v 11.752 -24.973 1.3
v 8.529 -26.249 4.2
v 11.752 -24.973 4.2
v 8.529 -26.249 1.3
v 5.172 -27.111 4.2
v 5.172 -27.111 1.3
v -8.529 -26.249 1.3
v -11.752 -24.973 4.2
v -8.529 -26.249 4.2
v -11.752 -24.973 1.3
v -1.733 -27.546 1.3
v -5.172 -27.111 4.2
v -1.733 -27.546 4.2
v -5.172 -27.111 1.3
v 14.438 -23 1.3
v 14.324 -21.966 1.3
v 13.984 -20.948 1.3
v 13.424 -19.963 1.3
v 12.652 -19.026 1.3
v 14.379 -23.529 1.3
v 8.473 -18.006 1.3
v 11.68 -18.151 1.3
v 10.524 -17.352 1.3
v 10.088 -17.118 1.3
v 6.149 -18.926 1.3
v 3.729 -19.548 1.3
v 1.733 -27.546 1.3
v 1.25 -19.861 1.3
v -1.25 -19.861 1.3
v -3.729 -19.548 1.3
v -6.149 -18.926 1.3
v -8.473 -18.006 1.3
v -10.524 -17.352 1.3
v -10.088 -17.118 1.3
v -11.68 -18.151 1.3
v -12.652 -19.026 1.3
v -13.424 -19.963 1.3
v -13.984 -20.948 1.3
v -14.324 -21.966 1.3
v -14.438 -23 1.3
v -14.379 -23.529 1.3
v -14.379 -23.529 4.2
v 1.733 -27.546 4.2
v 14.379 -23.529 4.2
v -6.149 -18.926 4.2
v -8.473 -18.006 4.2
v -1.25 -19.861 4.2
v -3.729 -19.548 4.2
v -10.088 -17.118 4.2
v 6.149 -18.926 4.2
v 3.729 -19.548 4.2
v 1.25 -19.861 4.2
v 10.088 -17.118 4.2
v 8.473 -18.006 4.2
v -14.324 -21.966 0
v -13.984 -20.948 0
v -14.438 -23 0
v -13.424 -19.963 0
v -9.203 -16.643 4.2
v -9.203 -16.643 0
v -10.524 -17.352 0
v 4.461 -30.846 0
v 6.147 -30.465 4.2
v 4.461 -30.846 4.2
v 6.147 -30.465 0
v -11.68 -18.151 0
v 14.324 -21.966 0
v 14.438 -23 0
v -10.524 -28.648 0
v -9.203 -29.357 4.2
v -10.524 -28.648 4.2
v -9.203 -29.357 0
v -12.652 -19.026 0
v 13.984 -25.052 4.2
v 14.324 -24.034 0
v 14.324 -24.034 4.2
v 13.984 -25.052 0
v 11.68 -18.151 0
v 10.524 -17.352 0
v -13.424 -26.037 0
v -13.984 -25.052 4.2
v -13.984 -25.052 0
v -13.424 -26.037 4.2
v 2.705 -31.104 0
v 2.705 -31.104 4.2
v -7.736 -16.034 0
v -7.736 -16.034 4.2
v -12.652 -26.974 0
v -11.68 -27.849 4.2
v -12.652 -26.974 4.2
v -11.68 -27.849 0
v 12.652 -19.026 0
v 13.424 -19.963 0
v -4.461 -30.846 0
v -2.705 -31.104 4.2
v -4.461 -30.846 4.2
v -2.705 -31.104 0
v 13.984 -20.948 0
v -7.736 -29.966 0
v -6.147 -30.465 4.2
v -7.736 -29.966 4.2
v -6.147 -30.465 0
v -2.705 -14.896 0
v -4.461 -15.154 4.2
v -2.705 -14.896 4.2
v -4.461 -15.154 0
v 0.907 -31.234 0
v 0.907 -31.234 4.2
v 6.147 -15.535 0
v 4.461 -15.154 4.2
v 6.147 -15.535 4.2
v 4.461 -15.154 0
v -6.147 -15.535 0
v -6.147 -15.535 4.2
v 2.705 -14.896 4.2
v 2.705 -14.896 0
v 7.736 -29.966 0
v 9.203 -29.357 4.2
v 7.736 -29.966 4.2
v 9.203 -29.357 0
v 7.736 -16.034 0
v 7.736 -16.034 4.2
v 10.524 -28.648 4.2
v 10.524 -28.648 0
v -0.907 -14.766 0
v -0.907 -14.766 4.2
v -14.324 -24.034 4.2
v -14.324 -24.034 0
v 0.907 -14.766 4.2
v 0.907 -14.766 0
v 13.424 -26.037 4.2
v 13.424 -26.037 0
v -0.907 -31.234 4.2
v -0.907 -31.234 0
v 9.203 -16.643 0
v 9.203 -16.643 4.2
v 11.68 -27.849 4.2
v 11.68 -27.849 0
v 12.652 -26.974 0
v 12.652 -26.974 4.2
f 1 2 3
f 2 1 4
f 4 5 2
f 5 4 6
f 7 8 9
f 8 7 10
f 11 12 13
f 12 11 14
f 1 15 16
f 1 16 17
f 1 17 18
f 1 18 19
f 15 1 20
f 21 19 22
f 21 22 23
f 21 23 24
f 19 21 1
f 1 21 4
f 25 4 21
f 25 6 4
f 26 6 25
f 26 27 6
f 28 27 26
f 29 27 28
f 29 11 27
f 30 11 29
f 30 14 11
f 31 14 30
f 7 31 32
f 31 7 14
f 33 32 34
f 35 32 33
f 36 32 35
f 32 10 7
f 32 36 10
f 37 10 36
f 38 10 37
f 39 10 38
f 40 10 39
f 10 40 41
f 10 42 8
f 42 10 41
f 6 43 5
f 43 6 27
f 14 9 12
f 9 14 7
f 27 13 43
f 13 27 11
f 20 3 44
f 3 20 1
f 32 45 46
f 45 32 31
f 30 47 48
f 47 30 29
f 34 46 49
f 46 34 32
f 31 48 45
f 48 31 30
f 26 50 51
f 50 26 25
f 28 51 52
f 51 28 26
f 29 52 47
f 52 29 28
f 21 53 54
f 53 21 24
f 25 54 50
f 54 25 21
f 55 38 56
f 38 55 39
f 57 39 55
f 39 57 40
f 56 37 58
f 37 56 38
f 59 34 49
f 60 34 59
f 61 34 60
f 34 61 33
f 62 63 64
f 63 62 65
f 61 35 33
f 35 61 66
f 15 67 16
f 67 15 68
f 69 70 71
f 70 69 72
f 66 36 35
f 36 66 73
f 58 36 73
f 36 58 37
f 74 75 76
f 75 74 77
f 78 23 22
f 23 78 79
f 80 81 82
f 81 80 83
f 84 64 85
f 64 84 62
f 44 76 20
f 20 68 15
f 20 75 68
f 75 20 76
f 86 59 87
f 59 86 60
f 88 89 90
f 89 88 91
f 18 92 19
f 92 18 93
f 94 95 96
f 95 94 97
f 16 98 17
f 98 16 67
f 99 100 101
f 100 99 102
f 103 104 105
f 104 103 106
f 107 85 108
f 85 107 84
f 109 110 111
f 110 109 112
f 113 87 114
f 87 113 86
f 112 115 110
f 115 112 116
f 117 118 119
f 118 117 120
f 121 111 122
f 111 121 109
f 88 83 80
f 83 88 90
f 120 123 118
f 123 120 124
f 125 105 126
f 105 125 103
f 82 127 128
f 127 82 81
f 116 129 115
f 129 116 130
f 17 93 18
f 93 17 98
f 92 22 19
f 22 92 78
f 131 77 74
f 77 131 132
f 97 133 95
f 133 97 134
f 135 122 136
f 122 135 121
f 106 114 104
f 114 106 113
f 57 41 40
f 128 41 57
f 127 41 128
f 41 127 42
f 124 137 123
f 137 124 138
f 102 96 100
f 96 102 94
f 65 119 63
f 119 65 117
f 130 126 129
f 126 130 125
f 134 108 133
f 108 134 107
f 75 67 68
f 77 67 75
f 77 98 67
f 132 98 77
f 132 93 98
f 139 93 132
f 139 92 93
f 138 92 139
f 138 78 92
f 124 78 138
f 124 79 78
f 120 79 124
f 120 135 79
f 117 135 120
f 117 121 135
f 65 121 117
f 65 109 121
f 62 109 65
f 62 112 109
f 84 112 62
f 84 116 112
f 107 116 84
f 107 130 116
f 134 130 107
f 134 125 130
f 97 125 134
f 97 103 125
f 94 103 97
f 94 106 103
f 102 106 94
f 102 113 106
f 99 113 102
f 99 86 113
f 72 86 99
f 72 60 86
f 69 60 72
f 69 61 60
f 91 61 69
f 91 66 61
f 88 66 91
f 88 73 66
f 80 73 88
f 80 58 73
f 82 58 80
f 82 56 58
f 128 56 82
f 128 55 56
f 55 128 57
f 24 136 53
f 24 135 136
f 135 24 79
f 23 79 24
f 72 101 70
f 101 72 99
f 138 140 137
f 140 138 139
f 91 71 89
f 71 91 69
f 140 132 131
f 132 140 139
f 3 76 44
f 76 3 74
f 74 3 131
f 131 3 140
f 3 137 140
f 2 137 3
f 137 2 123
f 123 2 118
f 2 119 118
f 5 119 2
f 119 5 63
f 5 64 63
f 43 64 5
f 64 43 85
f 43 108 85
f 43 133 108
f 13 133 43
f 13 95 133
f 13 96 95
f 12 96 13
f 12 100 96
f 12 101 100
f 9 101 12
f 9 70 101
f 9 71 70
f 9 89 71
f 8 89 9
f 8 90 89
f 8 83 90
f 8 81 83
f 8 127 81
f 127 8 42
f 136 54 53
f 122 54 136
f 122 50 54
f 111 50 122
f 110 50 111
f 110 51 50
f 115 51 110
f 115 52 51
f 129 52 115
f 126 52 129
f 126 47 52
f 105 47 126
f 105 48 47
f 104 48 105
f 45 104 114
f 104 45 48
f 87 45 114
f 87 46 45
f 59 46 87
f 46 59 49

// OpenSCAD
$fn=50;

translate([0,0,4.2]) rotate([0,180,0]) difference() {
   translate([0,-23,0.0]) scale([1.75,1.0,1]) cylinder(d=16.5,h=4.2);
   cutout();
}

module cutout() {
   translate([0,0,-0.1]) difference() {
      cylinder(d=55.2,h=3);
      translate([0,0,-0.1]) cylinder(d=39.8,h=4);
   }
}
